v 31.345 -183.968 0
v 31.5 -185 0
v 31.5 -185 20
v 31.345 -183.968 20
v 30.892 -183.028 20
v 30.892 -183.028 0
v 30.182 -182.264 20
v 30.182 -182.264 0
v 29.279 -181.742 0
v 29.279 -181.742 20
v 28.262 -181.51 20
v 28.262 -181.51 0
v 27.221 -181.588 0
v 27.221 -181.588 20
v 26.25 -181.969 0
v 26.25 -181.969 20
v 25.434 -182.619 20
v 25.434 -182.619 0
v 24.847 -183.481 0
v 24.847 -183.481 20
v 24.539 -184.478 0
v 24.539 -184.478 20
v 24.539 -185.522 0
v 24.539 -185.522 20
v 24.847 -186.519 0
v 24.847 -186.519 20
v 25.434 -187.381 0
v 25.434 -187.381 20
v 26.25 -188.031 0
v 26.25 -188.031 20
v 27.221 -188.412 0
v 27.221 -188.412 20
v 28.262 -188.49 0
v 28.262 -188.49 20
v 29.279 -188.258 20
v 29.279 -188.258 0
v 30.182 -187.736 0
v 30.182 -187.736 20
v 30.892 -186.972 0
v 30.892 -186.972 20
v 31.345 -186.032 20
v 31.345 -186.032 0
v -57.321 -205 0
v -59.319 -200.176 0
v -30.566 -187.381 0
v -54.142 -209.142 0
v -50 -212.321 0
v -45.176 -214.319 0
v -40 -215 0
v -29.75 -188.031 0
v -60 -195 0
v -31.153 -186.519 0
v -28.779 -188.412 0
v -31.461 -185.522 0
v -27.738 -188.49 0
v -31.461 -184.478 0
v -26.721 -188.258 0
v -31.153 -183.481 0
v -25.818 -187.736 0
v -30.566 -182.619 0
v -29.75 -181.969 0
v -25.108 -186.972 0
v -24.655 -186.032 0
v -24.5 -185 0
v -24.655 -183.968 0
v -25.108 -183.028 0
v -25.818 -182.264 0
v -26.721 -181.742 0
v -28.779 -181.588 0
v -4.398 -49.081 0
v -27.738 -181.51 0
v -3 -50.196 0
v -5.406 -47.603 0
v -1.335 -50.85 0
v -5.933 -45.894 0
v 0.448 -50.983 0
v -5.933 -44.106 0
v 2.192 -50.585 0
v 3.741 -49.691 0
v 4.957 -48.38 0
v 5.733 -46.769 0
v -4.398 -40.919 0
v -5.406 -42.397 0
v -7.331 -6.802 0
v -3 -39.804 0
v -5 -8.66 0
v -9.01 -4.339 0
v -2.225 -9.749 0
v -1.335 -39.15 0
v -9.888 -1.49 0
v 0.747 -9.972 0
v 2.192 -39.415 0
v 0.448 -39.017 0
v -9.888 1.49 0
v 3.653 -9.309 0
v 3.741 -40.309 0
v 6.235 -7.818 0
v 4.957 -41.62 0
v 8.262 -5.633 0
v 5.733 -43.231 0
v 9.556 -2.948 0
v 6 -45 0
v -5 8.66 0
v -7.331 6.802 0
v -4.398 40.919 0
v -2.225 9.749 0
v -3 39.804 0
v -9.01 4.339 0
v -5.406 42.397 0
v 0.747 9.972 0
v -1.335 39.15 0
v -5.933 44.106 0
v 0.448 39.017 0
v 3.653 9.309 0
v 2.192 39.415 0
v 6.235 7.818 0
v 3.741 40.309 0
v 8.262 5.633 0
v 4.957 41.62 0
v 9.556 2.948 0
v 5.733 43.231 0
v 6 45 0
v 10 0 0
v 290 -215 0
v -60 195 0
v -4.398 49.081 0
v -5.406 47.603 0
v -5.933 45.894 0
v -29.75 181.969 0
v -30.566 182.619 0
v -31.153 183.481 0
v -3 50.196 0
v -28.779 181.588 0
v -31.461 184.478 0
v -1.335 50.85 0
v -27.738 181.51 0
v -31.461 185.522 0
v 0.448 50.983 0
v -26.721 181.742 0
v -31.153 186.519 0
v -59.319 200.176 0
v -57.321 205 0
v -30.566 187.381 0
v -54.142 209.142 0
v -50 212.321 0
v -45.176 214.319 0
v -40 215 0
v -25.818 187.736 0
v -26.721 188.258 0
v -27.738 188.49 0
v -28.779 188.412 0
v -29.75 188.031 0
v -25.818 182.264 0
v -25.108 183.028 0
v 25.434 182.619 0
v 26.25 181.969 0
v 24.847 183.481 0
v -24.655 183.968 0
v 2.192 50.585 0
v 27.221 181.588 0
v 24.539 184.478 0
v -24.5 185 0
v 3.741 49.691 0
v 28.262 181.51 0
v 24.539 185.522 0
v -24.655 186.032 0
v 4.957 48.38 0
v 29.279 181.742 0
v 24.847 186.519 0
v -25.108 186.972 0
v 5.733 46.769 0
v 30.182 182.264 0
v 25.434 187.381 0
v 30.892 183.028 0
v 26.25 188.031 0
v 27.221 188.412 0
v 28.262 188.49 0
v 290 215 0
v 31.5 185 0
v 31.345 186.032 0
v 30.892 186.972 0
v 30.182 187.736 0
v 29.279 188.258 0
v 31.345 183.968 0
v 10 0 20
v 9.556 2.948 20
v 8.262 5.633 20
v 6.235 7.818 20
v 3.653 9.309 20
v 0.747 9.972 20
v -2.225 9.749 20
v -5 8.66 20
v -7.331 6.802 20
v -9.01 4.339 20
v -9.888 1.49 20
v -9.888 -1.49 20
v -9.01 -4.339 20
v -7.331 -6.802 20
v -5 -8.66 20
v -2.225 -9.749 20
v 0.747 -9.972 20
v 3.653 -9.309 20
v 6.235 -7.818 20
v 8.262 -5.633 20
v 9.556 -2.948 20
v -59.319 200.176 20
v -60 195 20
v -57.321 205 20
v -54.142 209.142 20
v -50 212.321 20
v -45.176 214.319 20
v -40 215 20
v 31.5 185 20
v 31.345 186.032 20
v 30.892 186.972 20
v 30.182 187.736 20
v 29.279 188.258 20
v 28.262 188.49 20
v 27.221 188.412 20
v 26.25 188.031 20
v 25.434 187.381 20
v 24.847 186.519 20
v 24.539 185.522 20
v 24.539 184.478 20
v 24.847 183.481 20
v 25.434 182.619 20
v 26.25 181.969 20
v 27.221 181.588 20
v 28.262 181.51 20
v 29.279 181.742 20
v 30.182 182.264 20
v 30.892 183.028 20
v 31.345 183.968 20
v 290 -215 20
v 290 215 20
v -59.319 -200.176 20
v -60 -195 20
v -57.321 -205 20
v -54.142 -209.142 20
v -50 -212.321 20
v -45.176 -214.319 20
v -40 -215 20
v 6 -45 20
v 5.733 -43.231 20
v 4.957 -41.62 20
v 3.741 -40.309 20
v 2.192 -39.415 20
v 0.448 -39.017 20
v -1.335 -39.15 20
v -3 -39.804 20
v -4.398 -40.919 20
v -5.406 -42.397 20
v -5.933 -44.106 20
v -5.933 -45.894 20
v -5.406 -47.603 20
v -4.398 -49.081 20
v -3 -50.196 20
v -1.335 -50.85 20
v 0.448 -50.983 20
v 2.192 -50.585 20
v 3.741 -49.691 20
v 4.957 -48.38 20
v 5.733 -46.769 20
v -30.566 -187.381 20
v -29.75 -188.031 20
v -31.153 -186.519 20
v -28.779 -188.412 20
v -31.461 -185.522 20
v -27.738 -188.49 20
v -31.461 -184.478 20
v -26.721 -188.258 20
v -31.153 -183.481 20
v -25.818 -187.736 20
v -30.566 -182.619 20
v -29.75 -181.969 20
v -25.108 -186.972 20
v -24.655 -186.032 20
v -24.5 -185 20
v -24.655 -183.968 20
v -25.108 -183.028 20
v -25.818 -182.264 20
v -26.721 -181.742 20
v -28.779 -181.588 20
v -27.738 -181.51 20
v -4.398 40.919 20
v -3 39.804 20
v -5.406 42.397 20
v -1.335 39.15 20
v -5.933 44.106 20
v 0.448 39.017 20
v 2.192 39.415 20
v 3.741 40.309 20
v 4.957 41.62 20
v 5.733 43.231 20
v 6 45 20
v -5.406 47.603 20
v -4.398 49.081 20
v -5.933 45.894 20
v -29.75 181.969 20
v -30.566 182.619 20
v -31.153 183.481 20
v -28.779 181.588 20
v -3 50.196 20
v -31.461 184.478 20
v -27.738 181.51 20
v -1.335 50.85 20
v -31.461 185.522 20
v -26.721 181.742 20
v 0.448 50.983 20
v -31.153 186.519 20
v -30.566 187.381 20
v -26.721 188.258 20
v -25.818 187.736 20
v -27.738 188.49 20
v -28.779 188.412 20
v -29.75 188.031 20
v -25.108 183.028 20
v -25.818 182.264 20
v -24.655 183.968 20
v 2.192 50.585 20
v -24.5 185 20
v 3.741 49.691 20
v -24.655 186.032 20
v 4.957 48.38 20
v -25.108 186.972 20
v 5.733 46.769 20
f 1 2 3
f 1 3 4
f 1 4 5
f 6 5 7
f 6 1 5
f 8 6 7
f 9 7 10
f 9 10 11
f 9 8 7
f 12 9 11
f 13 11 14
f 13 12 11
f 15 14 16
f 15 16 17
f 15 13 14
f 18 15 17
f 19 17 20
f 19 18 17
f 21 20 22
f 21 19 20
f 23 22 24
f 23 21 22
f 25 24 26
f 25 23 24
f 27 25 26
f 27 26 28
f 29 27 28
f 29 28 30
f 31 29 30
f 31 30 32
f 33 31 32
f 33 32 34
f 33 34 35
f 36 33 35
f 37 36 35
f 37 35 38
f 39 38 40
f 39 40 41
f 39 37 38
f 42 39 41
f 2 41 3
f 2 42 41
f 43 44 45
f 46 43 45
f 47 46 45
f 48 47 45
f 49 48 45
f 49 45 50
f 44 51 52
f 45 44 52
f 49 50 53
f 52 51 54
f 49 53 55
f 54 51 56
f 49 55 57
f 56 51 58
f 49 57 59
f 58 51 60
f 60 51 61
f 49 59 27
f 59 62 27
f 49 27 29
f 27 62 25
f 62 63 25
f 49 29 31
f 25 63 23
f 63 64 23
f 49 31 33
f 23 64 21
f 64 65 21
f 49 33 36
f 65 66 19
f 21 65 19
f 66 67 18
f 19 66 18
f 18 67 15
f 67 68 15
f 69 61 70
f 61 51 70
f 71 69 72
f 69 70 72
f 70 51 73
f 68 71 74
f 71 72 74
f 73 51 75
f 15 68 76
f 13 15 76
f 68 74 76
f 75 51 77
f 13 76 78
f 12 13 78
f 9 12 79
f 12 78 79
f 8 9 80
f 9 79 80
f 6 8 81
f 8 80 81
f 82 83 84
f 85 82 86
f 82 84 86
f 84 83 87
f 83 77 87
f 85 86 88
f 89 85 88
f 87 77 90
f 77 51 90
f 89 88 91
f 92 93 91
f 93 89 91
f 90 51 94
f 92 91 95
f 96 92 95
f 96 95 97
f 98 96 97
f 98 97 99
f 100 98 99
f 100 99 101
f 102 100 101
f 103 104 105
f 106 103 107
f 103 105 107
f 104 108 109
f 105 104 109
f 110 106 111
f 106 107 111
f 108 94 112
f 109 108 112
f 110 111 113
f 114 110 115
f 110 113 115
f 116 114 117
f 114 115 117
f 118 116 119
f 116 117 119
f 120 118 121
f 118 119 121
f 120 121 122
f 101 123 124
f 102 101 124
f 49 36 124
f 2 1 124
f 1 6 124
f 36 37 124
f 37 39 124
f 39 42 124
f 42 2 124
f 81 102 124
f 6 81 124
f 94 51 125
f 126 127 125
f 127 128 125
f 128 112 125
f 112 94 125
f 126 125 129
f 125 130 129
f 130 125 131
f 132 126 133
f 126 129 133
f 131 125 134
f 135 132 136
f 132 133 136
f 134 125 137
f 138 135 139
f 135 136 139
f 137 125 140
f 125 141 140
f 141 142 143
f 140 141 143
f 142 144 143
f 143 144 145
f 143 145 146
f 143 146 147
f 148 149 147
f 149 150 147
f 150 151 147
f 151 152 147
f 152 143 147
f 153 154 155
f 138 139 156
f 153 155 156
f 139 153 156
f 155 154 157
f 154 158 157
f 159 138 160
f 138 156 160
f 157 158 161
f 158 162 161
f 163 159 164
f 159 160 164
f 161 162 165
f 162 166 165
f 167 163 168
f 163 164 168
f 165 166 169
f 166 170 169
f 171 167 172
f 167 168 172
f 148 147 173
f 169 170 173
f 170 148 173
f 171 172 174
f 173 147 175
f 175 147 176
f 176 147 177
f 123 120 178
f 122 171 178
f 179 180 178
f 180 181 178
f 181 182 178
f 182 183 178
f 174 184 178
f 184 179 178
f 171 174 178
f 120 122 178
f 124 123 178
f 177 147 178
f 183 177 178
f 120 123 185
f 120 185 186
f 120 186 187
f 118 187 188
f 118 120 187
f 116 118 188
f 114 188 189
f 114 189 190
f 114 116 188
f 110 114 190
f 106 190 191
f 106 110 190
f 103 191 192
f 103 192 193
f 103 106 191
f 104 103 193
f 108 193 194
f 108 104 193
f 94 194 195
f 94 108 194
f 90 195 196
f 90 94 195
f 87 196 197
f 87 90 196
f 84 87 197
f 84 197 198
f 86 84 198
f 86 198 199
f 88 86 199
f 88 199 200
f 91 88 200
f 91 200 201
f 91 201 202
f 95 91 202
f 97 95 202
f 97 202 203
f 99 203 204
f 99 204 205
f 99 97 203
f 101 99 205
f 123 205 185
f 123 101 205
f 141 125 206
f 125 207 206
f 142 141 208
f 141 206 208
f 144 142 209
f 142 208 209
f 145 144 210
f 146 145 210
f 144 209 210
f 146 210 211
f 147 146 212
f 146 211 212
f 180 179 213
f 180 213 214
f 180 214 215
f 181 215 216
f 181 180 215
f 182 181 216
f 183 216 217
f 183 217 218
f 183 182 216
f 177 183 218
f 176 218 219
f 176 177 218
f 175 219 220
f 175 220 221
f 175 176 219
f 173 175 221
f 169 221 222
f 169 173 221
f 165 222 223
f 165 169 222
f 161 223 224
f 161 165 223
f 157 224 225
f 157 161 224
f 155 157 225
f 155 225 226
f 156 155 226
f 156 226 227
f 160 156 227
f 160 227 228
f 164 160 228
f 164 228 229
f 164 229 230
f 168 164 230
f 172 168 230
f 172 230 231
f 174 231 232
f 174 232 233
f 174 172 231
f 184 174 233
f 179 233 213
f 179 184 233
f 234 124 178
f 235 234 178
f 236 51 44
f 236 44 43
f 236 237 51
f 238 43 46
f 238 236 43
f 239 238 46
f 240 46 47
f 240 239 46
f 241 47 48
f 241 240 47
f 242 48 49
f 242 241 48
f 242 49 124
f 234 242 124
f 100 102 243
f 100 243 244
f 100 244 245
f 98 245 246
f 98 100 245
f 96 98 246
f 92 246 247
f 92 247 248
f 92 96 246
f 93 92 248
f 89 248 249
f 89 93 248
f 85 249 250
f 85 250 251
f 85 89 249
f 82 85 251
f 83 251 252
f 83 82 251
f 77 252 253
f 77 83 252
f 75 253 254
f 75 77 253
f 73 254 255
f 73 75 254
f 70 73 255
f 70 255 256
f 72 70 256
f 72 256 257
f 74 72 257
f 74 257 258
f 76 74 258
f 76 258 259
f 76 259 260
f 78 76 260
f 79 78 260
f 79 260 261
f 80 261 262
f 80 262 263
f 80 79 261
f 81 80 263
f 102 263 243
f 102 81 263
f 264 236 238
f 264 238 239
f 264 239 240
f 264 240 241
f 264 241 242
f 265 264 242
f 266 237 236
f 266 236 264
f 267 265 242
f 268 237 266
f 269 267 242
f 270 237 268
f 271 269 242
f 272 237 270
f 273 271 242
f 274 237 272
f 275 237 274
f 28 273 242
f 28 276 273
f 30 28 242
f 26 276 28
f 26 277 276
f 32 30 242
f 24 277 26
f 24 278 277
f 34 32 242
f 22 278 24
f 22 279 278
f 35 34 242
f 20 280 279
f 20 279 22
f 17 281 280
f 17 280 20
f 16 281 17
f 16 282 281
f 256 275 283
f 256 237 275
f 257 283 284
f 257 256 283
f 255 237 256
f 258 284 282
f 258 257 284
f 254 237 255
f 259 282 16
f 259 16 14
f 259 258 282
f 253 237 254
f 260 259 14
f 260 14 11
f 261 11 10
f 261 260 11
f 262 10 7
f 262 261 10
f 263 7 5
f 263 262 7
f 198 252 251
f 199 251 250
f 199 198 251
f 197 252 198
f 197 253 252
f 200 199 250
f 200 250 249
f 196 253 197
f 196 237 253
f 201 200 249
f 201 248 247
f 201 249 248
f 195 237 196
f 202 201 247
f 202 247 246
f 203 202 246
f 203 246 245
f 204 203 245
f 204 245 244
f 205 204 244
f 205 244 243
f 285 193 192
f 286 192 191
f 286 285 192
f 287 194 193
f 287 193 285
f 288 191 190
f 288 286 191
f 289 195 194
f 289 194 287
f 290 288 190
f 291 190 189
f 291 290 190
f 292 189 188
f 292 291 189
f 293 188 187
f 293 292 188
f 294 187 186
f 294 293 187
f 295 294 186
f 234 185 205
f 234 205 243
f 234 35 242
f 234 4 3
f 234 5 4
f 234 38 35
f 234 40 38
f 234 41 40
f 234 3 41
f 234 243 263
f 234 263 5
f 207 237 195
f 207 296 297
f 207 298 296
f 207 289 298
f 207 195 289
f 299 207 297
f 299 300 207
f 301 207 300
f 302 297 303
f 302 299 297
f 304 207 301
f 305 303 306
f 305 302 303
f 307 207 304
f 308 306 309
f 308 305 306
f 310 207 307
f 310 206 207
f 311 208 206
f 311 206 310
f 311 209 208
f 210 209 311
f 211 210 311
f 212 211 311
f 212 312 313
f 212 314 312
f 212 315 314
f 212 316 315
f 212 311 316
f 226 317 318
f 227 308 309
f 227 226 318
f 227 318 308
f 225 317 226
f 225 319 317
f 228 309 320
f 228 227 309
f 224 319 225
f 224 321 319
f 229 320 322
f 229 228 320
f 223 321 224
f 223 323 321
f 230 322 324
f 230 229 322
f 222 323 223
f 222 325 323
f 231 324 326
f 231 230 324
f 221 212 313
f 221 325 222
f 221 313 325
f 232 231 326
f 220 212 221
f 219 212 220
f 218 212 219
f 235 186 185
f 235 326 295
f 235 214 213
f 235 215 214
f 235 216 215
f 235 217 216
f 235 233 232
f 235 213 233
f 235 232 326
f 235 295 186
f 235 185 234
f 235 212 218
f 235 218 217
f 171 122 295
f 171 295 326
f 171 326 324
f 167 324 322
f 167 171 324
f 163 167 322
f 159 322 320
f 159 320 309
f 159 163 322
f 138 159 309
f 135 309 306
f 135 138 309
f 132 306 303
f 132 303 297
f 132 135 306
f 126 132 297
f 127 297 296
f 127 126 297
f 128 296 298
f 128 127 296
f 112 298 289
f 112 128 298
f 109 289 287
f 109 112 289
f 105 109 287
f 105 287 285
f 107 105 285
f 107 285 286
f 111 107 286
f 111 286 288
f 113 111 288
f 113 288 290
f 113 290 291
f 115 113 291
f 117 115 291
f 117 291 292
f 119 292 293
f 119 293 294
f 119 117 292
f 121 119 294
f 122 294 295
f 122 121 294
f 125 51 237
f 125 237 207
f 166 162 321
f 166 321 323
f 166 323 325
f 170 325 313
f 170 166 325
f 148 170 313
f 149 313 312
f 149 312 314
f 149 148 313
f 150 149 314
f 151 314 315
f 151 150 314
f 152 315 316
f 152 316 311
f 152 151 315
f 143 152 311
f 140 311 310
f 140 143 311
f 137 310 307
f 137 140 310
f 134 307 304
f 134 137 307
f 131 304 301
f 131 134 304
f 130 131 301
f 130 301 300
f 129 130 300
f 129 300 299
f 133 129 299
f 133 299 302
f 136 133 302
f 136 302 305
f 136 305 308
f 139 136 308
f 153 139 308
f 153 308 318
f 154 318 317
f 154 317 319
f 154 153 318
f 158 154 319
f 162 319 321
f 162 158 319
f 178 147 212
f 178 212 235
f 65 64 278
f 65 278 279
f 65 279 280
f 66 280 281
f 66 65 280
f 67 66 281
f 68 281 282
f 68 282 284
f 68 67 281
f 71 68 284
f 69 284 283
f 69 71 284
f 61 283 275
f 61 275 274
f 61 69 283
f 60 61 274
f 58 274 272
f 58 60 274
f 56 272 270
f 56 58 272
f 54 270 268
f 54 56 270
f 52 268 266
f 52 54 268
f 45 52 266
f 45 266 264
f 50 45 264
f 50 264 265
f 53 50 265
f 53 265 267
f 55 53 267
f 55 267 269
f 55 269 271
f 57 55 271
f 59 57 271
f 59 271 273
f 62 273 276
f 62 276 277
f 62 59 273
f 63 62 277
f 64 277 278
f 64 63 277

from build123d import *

# Parameters (mm, degrees)
SKETCH_1_W      = 350
SKETCH_1_H      = 430
SKETCH_1_R      = 3.5
SKETCH_1_R_2    = 6
SKETCH_1_R_3    = 10
EXTRUDE_1_DEPTH = 20
FILLET_1_R      = 20


with BuildPart() as part:
    # Эскиз1 → Бобышка-Вытянуть1 (new body)
    with BuildSketch(Plane.XY):
        with Locations((115, 0)):
            Rectangle(SKETCH_1_W, SKETCH_1_H)
        with Locations((-28, -185)):
            Circle(SKETCH_1_R, mode=Mode.SUBTRACT)
        with Locations((28, -185)):
            Circle(SKETCH_1_R, mode=Mode.SUBTRACT)
        with Locations((0, -45)):
            Circle(SKETCH_1_R_2, mode=Mode.SUBTRACT)
        Circle(SKETCH_1_R_3, mode=Mode.SUBTRACT)
        with Locations((0, 45)):
            Circle(SKETCH_1_R_2, mode=Mode.SUBTRACT)
        with Locations((-28, 185)):
            Circle(SKETCH_1_R, mode=Mode.SUBTRACT)
        with Locations((28, 185)):
            Circle(SKETCH_1_R, mode=Mode.SUBTRACT)
    extrude(amount=EXTRUDE_1_DEPTH)

    # Скругление1
    fillet_1_edges = [part.edges().sort_by_distance(p)[0] for p in [
        (-60, 215, 10),
        (-60, -215, 10),
    ]]
    fillet(fillet_1_edges, radius=FILLET_1_R)


solid = part.part
